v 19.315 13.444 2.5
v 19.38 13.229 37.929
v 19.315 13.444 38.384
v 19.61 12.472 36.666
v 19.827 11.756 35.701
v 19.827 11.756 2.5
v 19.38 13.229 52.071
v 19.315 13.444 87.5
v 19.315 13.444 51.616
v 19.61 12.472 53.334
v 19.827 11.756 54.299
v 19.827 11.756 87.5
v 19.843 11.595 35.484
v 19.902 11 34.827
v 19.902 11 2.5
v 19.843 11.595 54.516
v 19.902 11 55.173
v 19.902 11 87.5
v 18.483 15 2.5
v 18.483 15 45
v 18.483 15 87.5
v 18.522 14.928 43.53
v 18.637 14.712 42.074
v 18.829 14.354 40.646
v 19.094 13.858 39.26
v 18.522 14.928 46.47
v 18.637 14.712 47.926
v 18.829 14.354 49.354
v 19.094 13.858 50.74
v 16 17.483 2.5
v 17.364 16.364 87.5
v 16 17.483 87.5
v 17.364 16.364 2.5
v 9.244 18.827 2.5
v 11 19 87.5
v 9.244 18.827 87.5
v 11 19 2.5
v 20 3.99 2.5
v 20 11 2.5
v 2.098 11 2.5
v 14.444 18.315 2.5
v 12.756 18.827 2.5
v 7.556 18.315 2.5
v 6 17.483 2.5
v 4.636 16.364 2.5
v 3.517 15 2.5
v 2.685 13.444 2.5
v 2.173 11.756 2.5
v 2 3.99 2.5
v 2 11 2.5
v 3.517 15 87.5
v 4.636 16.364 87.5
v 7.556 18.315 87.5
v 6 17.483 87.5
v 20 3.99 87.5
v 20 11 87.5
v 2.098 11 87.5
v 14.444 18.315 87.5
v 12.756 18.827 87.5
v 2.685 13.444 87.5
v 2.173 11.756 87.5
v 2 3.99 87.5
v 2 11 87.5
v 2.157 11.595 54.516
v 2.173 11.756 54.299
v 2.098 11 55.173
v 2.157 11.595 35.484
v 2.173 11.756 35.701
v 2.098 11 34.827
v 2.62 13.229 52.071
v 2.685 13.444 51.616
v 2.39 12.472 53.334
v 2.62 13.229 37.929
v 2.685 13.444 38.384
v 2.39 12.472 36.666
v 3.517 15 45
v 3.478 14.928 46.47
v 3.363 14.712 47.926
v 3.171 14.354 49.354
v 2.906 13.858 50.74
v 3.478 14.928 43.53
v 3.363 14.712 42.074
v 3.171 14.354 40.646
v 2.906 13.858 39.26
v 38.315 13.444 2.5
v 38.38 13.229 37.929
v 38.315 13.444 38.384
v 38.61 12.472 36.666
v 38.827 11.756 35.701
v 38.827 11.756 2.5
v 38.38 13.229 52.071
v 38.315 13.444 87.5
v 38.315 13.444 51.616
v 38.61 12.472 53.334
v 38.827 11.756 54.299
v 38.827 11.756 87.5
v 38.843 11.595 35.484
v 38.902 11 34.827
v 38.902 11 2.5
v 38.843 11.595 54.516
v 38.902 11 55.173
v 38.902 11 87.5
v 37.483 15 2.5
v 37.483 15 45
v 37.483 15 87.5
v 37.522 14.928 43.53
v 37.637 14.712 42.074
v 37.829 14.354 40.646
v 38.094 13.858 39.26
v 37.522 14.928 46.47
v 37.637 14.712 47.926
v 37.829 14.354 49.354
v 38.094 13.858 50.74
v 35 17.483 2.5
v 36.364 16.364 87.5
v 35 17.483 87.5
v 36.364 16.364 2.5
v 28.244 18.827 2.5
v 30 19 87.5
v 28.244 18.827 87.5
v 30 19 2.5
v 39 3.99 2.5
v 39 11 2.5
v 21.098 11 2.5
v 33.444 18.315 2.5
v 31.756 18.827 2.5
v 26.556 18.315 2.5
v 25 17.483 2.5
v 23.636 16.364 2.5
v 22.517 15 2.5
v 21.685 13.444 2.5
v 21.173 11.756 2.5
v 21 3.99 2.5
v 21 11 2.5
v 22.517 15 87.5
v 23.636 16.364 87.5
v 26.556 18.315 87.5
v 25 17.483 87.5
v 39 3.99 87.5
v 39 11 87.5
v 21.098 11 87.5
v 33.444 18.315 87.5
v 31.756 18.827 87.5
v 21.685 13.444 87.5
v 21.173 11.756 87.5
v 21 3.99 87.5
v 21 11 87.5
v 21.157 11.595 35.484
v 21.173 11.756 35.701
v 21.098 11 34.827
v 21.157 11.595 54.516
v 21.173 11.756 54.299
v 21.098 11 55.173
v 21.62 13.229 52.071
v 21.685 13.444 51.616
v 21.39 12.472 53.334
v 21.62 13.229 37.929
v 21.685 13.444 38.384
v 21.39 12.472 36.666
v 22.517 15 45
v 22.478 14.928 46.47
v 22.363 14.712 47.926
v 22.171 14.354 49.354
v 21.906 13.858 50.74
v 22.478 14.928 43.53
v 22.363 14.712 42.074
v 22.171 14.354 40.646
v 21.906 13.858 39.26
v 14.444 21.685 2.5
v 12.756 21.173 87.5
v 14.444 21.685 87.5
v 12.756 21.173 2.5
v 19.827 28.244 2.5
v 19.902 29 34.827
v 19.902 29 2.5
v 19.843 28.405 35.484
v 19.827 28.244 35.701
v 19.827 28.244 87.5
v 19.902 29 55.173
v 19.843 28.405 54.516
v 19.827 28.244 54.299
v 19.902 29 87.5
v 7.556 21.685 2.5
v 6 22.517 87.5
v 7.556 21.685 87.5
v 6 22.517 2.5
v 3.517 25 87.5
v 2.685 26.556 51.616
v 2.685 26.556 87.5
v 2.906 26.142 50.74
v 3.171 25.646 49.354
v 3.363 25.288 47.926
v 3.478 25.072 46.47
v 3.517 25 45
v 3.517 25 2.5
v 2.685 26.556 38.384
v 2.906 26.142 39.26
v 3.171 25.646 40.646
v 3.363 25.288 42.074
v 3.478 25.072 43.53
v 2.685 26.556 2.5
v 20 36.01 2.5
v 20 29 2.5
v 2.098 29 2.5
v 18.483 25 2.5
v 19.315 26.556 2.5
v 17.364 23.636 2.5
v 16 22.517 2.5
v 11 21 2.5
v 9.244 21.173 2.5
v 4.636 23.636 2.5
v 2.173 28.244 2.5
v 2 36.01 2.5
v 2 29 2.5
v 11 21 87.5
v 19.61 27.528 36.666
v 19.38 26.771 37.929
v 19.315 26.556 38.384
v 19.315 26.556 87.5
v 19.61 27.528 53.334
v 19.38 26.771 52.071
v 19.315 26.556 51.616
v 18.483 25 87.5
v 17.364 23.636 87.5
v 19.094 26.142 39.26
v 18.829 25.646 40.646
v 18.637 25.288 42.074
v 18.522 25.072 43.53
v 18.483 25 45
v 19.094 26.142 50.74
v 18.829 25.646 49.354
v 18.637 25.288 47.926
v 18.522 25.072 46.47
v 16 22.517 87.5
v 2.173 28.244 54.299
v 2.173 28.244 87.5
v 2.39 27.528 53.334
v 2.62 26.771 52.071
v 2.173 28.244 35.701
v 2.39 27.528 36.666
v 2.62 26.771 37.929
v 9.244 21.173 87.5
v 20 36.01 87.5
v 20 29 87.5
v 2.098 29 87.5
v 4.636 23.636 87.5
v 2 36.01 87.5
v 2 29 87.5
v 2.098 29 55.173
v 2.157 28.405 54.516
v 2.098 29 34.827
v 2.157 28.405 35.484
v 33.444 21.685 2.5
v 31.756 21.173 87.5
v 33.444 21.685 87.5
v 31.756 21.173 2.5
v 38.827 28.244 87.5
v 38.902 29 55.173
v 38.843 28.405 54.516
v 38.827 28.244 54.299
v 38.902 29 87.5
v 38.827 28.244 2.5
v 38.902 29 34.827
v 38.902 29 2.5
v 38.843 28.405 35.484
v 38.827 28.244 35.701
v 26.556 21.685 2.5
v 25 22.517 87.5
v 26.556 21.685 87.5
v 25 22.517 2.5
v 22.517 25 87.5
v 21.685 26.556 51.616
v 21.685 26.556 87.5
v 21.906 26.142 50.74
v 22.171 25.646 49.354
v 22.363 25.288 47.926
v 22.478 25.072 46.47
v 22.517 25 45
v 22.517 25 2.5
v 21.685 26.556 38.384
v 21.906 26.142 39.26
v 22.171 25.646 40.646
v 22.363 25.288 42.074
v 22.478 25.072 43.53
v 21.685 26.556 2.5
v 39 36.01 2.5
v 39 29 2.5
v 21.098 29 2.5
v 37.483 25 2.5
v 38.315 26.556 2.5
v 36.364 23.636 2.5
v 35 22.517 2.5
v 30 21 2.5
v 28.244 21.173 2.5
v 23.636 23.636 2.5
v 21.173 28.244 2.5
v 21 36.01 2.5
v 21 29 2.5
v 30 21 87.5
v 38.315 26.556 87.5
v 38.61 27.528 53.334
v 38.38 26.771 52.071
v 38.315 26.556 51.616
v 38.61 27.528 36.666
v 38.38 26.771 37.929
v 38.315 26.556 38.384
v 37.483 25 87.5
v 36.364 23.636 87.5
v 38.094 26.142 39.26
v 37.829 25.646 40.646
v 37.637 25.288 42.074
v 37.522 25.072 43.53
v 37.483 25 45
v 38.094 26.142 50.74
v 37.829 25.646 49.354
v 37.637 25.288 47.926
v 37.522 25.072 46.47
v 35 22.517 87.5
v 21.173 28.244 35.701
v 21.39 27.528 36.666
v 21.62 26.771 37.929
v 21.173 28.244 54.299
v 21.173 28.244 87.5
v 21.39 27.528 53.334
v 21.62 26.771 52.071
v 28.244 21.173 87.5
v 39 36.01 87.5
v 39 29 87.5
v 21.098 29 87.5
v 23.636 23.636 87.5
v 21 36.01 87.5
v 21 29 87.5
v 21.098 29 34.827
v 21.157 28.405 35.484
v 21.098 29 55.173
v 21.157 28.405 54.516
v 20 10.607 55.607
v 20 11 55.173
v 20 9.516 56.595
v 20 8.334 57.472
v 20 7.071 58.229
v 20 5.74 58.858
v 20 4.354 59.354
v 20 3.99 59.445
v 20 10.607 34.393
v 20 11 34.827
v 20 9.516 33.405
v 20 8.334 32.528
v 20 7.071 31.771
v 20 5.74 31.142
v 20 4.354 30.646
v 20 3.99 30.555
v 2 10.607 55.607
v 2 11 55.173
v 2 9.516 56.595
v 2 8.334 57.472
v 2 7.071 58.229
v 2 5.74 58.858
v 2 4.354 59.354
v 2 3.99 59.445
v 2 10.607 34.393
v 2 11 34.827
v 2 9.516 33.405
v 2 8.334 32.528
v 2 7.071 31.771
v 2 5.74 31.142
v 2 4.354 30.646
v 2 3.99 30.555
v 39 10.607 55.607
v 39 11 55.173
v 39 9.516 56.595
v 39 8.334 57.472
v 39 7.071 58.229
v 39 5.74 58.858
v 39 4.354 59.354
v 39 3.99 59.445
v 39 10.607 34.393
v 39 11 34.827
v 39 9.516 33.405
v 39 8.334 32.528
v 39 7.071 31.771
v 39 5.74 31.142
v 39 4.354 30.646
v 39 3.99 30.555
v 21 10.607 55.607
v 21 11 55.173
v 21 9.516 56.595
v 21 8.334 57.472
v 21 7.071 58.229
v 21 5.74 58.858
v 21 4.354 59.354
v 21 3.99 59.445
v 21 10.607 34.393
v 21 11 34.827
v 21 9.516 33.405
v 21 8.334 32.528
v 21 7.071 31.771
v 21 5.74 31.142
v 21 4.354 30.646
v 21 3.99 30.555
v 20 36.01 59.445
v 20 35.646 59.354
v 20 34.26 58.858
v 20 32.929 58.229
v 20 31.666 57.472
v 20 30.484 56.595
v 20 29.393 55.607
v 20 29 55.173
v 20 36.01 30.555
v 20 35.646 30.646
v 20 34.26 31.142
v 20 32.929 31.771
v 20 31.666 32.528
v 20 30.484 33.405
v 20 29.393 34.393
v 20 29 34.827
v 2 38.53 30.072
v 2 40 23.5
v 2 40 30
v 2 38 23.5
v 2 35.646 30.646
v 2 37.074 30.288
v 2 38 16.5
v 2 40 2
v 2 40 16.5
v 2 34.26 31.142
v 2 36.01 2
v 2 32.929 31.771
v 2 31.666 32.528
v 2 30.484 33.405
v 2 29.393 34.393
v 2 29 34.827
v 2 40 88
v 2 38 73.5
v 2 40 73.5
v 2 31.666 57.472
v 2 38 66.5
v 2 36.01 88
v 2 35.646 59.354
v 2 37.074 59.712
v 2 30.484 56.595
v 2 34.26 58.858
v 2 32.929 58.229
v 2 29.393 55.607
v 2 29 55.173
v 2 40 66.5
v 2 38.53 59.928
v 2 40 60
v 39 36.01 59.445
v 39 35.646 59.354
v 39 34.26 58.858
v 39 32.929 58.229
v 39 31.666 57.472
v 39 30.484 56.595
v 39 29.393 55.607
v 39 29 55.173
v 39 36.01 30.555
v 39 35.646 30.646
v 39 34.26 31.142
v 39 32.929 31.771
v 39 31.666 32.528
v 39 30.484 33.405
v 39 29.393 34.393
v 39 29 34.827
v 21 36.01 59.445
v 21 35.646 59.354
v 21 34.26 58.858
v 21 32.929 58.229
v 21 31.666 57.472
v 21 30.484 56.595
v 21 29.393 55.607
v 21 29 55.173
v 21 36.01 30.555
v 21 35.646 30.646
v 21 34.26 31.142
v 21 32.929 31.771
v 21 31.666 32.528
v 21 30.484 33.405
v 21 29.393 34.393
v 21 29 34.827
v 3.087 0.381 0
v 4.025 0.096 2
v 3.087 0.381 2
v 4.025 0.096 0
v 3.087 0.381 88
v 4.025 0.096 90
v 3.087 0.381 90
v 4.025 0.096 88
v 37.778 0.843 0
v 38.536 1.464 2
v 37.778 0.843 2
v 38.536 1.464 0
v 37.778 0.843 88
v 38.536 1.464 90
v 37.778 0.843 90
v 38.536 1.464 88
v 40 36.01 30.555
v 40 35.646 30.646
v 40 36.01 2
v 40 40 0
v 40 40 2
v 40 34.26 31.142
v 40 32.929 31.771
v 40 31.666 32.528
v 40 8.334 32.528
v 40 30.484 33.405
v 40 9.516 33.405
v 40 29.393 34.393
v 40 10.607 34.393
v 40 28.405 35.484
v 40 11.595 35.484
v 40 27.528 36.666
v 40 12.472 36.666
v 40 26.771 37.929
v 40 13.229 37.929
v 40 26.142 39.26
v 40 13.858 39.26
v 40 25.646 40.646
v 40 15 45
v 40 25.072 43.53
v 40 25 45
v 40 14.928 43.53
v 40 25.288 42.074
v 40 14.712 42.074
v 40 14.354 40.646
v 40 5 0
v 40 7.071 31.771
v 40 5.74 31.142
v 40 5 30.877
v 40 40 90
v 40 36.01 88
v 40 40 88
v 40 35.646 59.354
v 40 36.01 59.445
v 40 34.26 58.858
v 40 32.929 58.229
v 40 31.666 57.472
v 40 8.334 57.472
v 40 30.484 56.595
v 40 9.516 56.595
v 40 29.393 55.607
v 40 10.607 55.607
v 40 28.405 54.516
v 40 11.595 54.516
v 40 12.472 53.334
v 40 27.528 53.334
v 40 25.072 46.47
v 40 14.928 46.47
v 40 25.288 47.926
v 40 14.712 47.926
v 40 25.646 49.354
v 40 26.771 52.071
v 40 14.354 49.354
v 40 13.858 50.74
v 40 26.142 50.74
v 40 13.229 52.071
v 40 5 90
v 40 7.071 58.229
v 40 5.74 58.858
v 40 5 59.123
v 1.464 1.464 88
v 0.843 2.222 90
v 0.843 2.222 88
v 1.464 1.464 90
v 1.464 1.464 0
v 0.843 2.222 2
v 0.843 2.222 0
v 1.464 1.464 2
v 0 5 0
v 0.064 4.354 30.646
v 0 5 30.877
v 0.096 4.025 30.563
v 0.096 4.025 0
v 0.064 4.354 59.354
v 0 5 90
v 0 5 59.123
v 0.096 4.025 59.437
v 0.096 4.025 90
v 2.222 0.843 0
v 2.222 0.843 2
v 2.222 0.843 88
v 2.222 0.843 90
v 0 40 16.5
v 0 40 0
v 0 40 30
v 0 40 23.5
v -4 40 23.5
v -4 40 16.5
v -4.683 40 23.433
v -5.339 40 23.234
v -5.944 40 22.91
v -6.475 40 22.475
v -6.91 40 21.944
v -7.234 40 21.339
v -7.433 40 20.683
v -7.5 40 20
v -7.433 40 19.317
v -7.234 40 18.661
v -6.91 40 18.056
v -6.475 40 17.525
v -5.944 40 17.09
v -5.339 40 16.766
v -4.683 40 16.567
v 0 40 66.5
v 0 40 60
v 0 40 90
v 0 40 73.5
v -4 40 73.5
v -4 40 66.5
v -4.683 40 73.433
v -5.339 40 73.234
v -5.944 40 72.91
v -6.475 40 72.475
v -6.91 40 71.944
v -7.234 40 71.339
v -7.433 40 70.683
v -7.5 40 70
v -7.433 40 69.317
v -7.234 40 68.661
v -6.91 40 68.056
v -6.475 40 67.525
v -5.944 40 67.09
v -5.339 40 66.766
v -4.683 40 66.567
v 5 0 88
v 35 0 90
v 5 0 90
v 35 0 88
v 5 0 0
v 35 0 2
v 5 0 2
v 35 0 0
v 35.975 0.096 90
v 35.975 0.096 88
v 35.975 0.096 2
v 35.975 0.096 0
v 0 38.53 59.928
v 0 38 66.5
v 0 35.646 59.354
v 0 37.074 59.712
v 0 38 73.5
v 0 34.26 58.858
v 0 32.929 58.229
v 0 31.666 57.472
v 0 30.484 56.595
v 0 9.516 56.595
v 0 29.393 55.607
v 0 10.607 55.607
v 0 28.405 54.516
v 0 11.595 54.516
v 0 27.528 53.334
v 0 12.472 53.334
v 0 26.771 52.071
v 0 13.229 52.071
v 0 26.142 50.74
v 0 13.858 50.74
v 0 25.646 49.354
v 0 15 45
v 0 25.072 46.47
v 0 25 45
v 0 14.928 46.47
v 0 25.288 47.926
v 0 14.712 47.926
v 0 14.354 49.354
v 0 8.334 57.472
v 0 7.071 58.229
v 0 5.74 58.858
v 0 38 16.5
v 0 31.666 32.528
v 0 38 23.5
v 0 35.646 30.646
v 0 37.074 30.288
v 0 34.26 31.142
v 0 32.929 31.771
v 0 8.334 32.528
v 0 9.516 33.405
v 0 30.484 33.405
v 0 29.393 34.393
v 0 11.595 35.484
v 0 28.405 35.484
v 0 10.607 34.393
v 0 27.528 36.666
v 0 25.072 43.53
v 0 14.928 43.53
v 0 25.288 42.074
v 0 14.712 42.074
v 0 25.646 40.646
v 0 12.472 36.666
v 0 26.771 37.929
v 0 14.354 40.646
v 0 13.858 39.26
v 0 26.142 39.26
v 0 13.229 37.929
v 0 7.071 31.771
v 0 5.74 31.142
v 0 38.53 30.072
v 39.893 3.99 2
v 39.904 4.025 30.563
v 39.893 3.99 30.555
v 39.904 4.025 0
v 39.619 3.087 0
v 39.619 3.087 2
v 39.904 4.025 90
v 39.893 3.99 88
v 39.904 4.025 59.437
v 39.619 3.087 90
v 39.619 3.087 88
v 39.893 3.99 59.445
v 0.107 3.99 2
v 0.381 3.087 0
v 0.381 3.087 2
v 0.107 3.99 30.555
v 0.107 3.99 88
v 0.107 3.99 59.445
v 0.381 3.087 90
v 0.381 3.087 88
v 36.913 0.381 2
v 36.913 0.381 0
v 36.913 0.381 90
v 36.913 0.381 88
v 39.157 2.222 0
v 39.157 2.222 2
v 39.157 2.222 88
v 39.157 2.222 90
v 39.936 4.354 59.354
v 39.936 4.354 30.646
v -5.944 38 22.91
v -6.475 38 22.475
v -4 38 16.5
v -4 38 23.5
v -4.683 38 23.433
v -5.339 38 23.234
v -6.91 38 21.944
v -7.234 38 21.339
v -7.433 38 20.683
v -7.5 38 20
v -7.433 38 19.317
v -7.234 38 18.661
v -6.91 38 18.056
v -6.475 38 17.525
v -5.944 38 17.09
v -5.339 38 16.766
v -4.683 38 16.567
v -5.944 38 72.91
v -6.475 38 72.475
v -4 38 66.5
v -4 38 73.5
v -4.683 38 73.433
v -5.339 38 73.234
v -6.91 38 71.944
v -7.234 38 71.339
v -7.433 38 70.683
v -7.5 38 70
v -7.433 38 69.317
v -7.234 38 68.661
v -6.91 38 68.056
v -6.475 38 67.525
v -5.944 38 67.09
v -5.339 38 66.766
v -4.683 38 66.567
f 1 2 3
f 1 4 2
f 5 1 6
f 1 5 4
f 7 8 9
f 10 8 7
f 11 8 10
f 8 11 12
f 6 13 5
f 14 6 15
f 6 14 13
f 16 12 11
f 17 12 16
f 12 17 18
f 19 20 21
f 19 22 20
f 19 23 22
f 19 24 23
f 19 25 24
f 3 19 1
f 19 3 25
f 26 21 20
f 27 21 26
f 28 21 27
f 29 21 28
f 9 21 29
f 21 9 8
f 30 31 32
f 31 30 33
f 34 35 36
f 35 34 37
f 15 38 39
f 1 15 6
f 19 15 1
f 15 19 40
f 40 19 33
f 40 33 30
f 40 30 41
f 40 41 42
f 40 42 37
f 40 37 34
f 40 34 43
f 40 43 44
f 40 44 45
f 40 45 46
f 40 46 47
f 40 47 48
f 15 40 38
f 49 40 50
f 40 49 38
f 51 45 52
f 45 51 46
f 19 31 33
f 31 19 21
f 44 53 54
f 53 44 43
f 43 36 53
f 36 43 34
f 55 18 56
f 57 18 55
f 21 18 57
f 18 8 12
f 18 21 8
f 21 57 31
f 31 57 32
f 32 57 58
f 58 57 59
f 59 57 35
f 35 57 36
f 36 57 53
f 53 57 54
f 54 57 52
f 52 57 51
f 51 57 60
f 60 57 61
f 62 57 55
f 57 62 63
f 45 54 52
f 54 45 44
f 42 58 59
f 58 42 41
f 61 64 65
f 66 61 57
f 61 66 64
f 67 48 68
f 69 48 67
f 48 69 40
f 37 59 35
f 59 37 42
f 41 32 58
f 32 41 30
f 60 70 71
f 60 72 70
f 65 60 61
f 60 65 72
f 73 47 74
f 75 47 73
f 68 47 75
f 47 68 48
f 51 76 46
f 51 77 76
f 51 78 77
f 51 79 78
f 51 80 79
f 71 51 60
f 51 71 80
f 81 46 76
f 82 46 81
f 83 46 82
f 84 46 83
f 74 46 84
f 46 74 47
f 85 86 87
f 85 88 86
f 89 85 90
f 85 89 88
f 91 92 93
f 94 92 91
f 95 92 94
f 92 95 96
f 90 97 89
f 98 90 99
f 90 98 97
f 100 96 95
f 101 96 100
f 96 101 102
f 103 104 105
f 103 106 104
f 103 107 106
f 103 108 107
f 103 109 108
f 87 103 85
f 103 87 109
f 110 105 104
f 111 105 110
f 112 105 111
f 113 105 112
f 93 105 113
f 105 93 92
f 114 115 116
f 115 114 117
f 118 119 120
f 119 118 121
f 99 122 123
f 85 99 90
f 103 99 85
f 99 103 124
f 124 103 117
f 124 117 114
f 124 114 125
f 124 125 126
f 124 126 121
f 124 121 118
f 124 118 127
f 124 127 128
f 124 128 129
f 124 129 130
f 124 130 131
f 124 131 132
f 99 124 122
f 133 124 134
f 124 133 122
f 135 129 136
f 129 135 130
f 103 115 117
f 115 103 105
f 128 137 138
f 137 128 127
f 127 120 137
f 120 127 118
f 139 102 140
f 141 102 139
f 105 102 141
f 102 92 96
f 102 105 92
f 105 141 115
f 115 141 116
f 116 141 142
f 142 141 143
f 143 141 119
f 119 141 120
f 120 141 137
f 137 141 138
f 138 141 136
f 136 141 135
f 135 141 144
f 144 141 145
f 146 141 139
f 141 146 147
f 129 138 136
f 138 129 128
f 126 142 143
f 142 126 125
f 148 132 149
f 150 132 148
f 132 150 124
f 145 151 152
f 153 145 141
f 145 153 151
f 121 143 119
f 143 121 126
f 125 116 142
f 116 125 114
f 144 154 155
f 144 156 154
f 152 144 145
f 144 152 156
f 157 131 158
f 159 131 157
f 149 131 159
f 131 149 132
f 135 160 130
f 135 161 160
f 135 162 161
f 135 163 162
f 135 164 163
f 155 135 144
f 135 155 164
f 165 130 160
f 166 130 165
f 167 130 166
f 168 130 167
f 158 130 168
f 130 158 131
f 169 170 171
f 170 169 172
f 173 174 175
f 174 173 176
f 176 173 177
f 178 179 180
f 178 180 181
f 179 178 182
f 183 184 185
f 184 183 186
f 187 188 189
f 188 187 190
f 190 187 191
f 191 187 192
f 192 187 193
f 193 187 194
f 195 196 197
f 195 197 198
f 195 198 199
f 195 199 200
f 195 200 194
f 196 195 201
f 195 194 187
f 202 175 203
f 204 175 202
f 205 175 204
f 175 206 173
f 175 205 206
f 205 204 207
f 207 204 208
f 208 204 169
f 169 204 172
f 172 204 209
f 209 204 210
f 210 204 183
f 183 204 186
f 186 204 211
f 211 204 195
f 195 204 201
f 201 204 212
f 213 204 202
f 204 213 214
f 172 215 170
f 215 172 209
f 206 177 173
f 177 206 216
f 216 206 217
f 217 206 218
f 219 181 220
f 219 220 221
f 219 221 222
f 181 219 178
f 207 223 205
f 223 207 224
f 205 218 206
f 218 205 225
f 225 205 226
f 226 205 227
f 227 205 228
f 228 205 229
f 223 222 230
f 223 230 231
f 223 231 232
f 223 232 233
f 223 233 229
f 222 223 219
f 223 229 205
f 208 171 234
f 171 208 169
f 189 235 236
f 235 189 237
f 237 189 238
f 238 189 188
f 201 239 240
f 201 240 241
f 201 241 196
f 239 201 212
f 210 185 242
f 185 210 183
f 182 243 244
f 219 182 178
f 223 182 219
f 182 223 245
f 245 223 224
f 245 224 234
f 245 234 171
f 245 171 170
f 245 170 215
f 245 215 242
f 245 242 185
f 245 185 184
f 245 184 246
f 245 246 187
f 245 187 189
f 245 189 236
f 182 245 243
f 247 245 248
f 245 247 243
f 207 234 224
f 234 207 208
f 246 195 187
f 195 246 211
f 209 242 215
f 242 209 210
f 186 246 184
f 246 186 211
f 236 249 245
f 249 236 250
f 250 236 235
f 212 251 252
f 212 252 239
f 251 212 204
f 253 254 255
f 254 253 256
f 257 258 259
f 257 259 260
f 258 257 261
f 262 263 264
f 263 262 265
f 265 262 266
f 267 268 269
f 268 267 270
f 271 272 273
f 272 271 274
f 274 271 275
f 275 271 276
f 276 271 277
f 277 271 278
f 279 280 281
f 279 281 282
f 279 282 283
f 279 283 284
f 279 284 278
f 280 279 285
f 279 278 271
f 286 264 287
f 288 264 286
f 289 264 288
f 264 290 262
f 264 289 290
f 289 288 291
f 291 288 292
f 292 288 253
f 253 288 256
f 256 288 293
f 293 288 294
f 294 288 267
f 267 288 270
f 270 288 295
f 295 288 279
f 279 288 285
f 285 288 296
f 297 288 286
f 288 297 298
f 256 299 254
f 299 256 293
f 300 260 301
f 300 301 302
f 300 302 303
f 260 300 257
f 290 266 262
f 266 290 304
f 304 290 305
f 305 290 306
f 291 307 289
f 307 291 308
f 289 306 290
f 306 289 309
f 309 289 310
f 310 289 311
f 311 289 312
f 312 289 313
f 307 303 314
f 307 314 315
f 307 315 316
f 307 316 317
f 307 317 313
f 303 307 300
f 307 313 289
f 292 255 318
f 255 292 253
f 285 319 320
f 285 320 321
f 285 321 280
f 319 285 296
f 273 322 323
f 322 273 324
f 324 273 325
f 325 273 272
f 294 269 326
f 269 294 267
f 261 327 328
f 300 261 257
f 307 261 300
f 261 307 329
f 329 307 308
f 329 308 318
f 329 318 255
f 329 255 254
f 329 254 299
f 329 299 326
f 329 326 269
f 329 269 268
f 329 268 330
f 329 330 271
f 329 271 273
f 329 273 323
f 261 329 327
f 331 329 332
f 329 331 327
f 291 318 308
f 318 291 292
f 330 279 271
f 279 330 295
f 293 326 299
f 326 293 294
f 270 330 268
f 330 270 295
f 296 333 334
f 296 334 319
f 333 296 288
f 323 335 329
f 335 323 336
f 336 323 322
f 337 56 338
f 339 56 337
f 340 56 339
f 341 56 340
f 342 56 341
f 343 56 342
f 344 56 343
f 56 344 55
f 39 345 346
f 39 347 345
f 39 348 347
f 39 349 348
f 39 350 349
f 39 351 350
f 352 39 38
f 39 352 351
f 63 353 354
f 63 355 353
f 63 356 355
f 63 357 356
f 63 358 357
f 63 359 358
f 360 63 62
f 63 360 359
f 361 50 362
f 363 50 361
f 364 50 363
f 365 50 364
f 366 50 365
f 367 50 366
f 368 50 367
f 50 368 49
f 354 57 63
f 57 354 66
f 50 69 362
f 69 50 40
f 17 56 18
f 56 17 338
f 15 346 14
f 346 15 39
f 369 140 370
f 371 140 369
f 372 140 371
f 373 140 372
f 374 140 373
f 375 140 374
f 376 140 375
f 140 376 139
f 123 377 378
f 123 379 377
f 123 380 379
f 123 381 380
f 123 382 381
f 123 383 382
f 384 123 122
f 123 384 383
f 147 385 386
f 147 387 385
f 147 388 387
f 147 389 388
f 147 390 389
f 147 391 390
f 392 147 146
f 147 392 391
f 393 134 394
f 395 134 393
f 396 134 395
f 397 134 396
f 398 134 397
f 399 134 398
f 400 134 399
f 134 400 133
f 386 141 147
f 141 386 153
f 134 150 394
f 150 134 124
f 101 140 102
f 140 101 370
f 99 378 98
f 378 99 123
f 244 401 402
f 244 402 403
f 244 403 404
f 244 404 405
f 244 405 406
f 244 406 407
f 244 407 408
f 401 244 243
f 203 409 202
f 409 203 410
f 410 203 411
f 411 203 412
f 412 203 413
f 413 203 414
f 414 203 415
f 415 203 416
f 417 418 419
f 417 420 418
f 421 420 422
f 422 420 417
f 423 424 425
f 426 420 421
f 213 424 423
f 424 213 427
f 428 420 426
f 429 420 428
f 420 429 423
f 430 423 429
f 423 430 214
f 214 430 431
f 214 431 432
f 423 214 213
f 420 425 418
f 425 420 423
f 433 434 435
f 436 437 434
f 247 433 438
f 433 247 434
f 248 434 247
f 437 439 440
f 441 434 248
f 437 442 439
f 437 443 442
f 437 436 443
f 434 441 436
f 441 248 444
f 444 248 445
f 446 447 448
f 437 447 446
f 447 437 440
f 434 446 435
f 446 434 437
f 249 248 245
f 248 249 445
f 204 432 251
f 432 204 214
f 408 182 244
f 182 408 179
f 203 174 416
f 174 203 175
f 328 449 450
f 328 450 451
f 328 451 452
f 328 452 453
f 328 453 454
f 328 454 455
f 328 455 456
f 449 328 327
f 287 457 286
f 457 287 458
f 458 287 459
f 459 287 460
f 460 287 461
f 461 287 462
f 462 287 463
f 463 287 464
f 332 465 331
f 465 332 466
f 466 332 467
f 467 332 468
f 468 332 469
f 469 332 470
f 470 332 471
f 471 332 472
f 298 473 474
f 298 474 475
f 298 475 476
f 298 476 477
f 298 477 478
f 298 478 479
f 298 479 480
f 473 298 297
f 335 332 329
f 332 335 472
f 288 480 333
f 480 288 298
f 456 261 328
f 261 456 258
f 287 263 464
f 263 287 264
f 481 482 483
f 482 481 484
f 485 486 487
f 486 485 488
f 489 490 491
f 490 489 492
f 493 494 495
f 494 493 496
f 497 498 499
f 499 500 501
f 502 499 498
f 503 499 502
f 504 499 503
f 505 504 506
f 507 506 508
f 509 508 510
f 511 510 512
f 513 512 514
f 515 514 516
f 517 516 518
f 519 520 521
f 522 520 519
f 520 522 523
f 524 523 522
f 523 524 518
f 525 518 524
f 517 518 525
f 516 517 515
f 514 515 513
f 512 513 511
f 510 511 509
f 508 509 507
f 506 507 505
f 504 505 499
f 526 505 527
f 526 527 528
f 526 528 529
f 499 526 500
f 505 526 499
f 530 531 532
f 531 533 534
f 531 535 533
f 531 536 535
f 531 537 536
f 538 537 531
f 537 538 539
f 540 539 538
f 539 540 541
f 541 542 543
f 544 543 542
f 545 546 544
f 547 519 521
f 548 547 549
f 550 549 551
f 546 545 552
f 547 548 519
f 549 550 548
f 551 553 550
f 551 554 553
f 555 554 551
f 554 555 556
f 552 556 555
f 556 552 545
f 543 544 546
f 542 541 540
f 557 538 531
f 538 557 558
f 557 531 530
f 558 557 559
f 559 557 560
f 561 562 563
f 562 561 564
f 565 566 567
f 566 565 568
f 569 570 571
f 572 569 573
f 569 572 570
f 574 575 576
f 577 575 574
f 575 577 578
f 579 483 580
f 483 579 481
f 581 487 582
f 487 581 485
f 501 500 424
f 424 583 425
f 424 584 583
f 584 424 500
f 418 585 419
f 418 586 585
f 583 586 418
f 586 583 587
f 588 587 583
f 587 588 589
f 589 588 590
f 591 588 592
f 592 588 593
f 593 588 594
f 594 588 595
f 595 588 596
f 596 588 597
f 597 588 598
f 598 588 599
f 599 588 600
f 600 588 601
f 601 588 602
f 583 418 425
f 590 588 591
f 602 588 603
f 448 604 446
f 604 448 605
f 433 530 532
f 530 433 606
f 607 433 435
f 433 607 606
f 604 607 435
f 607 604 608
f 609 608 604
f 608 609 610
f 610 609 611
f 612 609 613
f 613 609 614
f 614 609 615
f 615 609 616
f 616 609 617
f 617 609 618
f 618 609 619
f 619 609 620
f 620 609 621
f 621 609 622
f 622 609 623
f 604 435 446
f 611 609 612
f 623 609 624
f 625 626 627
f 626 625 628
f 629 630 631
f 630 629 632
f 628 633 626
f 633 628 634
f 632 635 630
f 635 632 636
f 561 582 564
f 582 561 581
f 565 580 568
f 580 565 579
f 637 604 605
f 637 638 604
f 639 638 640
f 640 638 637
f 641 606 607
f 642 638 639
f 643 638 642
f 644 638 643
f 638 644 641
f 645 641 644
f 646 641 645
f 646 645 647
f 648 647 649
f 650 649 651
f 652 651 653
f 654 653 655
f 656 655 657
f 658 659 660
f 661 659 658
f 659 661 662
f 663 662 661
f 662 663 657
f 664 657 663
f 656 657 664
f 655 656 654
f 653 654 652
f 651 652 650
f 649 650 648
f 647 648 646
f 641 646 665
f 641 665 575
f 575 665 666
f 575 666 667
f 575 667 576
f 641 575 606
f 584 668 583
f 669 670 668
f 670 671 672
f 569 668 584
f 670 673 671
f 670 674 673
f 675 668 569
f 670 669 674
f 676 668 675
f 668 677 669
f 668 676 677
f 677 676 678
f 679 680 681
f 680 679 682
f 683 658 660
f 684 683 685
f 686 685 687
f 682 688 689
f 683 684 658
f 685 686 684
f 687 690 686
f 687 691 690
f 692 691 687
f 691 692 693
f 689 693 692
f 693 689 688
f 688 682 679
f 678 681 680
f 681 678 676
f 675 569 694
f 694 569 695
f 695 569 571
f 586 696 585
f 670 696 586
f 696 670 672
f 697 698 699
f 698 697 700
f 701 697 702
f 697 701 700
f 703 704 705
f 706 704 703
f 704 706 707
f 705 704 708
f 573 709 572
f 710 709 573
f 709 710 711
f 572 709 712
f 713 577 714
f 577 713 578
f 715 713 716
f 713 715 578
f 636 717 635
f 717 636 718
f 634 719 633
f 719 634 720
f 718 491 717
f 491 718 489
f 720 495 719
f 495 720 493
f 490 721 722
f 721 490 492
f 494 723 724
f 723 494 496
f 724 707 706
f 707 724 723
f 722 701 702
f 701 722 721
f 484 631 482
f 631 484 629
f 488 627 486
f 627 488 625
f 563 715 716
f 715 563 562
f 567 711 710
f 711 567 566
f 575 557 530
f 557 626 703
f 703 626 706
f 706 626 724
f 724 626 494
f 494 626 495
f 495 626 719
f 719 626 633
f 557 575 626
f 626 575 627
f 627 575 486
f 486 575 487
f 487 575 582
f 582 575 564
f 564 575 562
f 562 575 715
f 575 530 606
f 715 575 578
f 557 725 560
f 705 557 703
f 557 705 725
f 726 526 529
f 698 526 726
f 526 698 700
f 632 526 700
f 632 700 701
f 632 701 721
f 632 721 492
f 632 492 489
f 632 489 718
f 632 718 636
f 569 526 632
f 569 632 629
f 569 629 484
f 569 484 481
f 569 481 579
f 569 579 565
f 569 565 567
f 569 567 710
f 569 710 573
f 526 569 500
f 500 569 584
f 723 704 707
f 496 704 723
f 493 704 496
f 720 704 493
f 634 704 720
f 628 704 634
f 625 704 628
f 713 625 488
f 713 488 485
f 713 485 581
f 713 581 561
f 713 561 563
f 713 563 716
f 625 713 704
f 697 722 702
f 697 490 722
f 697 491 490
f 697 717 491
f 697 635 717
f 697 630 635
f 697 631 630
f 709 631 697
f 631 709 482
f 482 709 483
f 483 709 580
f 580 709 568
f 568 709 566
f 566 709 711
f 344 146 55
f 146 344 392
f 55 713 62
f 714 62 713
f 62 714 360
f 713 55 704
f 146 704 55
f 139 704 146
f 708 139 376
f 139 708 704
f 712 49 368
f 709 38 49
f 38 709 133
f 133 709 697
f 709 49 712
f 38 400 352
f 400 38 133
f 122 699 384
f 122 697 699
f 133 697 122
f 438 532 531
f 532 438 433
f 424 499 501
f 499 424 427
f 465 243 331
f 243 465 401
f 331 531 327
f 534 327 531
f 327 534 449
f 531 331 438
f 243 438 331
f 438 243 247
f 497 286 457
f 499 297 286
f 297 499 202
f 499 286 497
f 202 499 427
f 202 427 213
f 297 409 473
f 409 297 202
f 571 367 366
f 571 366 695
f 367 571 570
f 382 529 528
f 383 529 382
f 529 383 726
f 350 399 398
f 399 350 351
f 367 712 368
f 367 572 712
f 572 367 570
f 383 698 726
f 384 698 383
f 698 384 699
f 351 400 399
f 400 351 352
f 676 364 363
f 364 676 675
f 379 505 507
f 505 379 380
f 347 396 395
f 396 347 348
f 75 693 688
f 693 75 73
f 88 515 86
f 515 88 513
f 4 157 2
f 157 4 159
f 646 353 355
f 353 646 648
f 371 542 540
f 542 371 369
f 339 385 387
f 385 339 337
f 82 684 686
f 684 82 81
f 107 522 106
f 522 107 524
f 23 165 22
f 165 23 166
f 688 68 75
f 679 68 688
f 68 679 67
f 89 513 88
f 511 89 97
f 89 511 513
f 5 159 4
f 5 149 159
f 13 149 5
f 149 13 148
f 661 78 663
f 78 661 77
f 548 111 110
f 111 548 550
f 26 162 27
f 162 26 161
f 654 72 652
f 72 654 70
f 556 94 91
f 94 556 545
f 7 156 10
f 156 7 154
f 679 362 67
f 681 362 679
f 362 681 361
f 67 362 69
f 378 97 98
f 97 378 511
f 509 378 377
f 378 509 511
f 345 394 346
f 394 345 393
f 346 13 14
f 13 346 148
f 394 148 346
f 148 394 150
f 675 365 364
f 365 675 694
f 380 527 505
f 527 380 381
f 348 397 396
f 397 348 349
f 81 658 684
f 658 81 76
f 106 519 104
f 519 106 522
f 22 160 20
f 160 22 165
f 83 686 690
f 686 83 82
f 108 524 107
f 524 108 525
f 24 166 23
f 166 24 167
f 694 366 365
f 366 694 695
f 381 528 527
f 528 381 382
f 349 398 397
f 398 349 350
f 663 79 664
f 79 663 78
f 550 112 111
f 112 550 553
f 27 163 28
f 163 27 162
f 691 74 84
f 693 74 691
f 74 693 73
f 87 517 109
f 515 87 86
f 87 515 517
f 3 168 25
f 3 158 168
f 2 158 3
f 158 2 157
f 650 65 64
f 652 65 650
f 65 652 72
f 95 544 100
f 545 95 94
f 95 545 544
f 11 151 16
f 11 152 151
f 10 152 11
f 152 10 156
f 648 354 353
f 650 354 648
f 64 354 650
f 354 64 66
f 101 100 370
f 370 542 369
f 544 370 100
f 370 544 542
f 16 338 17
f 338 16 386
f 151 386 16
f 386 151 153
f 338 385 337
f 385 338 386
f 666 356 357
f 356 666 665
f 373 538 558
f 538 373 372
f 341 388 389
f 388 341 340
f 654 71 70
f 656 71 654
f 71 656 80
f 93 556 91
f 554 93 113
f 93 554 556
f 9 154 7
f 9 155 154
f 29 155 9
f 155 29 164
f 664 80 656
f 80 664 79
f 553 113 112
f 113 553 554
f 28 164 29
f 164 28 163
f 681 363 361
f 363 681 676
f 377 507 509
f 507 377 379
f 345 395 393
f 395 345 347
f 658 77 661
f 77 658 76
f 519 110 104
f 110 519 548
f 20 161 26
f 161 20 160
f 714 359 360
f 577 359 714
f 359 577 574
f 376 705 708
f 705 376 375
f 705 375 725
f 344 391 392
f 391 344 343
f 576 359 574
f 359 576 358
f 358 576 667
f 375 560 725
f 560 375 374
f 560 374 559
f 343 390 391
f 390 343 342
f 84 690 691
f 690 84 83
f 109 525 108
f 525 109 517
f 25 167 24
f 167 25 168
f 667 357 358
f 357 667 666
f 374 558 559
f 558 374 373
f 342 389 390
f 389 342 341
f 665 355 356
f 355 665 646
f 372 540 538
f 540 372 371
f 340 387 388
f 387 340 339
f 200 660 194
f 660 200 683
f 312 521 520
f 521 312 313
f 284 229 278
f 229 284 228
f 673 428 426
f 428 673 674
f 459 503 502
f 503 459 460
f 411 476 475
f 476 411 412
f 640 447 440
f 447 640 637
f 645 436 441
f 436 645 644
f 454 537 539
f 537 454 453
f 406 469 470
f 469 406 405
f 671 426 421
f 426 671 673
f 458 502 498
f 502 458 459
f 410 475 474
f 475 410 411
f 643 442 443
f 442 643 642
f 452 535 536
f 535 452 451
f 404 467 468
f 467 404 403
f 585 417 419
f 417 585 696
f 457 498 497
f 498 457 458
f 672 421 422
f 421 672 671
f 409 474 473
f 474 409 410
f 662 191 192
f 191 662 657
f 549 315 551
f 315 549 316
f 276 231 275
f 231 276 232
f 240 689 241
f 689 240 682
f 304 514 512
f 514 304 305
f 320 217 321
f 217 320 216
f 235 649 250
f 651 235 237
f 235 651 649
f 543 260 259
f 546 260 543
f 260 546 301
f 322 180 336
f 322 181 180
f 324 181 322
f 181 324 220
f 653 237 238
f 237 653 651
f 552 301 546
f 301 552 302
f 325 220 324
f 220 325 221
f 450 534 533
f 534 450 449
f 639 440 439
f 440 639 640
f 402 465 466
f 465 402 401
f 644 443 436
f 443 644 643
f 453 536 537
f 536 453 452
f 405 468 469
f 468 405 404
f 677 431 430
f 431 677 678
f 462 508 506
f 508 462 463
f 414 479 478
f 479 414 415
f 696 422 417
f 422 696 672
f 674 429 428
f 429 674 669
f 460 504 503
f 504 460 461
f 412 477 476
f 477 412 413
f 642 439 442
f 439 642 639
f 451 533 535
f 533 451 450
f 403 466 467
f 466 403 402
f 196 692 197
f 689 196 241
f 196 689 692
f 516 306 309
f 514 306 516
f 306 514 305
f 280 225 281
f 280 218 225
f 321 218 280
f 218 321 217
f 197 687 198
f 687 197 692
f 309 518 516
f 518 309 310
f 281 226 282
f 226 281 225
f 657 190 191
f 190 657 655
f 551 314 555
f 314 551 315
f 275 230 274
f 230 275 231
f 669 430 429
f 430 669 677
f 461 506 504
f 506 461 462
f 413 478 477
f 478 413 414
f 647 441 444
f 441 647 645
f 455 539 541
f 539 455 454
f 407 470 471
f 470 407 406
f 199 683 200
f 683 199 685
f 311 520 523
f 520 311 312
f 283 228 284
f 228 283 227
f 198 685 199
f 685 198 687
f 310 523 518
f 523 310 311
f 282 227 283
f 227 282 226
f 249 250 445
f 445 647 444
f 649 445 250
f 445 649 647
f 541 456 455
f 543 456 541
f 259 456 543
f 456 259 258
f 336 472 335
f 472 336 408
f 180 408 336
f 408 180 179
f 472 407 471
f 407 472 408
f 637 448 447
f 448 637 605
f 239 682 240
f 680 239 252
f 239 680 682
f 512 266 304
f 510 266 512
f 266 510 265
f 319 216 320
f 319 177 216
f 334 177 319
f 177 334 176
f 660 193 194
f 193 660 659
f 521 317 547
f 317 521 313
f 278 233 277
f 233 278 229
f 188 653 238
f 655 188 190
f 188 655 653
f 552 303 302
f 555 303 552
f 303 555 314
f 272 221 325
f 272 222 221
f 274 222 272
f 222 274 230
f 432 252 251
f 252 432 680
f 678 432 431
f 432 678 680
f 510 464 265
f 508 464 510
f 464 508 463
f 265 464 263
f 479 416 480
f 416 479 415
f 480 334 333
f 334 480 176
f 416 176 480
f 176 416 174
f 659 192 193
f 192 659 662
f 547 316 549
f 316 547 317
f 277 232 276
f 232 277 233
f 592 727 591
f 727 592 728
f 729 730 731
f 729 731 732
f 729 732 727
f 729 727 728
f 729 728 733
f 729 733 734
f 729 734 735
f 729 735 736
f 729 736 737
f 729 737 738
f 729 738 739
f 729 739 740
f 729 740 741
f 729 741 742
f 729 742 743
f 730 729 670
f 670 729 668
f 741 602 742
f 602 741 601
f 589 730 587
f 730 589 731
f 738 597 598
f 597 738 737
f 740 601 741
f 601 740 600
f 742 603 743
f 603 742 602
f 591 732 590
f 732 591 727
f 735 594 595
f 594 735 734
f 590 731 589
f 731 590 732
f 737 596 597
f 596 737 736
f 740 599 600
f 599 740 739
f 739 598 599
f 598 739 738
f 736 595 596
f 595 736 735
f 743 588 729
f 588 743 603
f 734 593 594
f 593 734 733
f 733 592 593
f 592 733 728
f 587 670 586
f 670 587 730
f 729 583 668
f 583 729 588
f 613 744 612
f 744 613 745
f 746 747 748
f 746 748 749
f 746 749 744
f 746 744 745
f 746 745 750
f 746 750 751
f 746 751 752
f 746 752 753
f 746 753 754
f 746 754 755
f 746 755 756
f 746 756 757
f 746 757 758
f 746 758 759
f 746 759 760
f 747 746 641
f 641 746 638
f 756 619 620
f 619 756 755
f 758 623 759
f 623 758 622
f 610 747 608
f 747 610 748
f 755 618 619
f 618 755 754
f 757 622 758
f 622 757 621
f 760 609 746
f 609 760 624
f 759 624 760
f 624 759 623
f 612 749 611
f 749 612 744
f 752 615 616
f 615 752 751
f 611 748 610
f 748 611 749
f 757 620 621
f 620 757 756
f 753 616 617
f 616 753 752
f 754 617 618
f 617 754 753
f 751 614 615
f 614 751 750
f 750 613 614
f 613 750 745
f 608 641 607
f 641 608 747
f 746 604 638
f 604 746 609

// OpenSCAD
size = [40, 40, 90];
corn = 10;

union() {
    difference() {
        hull() {
            translate([corn/2, corn/2]) cylinder($fn=32, h=size[2], d=corn);
            translate([size[0]-corn/2, corn/2]) cylinder($fn=32, h=size[2], d=corn);
            //translate([corn/2, size[1]-corn/2]) cylinder($fn=32, h=size[2], d=corn);
            translate([size[0]-1, size[1]-1]) cube([1, 1, size[2]]);
            translate([0, size[1]-1]) cube([1, 1, size[2]]);
        }
        
        translate([-0.5, 0-0.01, 2]) cube([size[0]+1, 4, 90-4]);
        translate([2, size[1]-4+0.01, 2]) cube([size[0]+1, 4, 90-4]);
        
        translate([-10, 0, size[2]/2]) rotate([0, 90, 0]) cylinder($fn=64, h=100, d=30);
        translate([-10, size[1], size[2]/2]) rotate([0, 90, 0]) cylinder($fn=64, h=100, d=30);


    translate([0, 0, 2.5]) {
        translate([18/2+2, 10, 0]) color("grey") cylinder($fn=32, h=85, d=18);
        translate([19+18/2+2, 10, 0]) color("grey") cylinder($fn=32, h=85, d=18);
        translate([18/2+2, 30, 0]) color("grey") cylinder($fn=32, h=85, d=18);
        translate([19+18/2+2, 30, 0]) color("grey") cylinder($fn=32, h=85, d=18);

        translate([2, -10-9, 0]) color("black") cube([18, 30, 85]);
        translate([19+2, -10-9, 0]) color("black") cube([18, 30, 85]);
        translate([2, 20+9, 0]) color("black") cube([18, 30, 85]);
        translate([19+2, 20+9, 0]) color("black") cube([18, 30, 85]);
    }

    }
    
    translate([-4, size[1], 20]) rotate([90, 0, 0]) cylinder($fn=32, h=2, d=7);
    translate([-4, size[1]-2, 20-3.5]) cube([6, 2, 7]);
    translate([-4, size[1], size[2]-20]) rotate([90, 0, 0]) cylinder($fn=32, h=2, d=7);
    translate([-4, size[1]-2, size[2]-20-3.5]) cube([6, 2, 7]);
    
}
